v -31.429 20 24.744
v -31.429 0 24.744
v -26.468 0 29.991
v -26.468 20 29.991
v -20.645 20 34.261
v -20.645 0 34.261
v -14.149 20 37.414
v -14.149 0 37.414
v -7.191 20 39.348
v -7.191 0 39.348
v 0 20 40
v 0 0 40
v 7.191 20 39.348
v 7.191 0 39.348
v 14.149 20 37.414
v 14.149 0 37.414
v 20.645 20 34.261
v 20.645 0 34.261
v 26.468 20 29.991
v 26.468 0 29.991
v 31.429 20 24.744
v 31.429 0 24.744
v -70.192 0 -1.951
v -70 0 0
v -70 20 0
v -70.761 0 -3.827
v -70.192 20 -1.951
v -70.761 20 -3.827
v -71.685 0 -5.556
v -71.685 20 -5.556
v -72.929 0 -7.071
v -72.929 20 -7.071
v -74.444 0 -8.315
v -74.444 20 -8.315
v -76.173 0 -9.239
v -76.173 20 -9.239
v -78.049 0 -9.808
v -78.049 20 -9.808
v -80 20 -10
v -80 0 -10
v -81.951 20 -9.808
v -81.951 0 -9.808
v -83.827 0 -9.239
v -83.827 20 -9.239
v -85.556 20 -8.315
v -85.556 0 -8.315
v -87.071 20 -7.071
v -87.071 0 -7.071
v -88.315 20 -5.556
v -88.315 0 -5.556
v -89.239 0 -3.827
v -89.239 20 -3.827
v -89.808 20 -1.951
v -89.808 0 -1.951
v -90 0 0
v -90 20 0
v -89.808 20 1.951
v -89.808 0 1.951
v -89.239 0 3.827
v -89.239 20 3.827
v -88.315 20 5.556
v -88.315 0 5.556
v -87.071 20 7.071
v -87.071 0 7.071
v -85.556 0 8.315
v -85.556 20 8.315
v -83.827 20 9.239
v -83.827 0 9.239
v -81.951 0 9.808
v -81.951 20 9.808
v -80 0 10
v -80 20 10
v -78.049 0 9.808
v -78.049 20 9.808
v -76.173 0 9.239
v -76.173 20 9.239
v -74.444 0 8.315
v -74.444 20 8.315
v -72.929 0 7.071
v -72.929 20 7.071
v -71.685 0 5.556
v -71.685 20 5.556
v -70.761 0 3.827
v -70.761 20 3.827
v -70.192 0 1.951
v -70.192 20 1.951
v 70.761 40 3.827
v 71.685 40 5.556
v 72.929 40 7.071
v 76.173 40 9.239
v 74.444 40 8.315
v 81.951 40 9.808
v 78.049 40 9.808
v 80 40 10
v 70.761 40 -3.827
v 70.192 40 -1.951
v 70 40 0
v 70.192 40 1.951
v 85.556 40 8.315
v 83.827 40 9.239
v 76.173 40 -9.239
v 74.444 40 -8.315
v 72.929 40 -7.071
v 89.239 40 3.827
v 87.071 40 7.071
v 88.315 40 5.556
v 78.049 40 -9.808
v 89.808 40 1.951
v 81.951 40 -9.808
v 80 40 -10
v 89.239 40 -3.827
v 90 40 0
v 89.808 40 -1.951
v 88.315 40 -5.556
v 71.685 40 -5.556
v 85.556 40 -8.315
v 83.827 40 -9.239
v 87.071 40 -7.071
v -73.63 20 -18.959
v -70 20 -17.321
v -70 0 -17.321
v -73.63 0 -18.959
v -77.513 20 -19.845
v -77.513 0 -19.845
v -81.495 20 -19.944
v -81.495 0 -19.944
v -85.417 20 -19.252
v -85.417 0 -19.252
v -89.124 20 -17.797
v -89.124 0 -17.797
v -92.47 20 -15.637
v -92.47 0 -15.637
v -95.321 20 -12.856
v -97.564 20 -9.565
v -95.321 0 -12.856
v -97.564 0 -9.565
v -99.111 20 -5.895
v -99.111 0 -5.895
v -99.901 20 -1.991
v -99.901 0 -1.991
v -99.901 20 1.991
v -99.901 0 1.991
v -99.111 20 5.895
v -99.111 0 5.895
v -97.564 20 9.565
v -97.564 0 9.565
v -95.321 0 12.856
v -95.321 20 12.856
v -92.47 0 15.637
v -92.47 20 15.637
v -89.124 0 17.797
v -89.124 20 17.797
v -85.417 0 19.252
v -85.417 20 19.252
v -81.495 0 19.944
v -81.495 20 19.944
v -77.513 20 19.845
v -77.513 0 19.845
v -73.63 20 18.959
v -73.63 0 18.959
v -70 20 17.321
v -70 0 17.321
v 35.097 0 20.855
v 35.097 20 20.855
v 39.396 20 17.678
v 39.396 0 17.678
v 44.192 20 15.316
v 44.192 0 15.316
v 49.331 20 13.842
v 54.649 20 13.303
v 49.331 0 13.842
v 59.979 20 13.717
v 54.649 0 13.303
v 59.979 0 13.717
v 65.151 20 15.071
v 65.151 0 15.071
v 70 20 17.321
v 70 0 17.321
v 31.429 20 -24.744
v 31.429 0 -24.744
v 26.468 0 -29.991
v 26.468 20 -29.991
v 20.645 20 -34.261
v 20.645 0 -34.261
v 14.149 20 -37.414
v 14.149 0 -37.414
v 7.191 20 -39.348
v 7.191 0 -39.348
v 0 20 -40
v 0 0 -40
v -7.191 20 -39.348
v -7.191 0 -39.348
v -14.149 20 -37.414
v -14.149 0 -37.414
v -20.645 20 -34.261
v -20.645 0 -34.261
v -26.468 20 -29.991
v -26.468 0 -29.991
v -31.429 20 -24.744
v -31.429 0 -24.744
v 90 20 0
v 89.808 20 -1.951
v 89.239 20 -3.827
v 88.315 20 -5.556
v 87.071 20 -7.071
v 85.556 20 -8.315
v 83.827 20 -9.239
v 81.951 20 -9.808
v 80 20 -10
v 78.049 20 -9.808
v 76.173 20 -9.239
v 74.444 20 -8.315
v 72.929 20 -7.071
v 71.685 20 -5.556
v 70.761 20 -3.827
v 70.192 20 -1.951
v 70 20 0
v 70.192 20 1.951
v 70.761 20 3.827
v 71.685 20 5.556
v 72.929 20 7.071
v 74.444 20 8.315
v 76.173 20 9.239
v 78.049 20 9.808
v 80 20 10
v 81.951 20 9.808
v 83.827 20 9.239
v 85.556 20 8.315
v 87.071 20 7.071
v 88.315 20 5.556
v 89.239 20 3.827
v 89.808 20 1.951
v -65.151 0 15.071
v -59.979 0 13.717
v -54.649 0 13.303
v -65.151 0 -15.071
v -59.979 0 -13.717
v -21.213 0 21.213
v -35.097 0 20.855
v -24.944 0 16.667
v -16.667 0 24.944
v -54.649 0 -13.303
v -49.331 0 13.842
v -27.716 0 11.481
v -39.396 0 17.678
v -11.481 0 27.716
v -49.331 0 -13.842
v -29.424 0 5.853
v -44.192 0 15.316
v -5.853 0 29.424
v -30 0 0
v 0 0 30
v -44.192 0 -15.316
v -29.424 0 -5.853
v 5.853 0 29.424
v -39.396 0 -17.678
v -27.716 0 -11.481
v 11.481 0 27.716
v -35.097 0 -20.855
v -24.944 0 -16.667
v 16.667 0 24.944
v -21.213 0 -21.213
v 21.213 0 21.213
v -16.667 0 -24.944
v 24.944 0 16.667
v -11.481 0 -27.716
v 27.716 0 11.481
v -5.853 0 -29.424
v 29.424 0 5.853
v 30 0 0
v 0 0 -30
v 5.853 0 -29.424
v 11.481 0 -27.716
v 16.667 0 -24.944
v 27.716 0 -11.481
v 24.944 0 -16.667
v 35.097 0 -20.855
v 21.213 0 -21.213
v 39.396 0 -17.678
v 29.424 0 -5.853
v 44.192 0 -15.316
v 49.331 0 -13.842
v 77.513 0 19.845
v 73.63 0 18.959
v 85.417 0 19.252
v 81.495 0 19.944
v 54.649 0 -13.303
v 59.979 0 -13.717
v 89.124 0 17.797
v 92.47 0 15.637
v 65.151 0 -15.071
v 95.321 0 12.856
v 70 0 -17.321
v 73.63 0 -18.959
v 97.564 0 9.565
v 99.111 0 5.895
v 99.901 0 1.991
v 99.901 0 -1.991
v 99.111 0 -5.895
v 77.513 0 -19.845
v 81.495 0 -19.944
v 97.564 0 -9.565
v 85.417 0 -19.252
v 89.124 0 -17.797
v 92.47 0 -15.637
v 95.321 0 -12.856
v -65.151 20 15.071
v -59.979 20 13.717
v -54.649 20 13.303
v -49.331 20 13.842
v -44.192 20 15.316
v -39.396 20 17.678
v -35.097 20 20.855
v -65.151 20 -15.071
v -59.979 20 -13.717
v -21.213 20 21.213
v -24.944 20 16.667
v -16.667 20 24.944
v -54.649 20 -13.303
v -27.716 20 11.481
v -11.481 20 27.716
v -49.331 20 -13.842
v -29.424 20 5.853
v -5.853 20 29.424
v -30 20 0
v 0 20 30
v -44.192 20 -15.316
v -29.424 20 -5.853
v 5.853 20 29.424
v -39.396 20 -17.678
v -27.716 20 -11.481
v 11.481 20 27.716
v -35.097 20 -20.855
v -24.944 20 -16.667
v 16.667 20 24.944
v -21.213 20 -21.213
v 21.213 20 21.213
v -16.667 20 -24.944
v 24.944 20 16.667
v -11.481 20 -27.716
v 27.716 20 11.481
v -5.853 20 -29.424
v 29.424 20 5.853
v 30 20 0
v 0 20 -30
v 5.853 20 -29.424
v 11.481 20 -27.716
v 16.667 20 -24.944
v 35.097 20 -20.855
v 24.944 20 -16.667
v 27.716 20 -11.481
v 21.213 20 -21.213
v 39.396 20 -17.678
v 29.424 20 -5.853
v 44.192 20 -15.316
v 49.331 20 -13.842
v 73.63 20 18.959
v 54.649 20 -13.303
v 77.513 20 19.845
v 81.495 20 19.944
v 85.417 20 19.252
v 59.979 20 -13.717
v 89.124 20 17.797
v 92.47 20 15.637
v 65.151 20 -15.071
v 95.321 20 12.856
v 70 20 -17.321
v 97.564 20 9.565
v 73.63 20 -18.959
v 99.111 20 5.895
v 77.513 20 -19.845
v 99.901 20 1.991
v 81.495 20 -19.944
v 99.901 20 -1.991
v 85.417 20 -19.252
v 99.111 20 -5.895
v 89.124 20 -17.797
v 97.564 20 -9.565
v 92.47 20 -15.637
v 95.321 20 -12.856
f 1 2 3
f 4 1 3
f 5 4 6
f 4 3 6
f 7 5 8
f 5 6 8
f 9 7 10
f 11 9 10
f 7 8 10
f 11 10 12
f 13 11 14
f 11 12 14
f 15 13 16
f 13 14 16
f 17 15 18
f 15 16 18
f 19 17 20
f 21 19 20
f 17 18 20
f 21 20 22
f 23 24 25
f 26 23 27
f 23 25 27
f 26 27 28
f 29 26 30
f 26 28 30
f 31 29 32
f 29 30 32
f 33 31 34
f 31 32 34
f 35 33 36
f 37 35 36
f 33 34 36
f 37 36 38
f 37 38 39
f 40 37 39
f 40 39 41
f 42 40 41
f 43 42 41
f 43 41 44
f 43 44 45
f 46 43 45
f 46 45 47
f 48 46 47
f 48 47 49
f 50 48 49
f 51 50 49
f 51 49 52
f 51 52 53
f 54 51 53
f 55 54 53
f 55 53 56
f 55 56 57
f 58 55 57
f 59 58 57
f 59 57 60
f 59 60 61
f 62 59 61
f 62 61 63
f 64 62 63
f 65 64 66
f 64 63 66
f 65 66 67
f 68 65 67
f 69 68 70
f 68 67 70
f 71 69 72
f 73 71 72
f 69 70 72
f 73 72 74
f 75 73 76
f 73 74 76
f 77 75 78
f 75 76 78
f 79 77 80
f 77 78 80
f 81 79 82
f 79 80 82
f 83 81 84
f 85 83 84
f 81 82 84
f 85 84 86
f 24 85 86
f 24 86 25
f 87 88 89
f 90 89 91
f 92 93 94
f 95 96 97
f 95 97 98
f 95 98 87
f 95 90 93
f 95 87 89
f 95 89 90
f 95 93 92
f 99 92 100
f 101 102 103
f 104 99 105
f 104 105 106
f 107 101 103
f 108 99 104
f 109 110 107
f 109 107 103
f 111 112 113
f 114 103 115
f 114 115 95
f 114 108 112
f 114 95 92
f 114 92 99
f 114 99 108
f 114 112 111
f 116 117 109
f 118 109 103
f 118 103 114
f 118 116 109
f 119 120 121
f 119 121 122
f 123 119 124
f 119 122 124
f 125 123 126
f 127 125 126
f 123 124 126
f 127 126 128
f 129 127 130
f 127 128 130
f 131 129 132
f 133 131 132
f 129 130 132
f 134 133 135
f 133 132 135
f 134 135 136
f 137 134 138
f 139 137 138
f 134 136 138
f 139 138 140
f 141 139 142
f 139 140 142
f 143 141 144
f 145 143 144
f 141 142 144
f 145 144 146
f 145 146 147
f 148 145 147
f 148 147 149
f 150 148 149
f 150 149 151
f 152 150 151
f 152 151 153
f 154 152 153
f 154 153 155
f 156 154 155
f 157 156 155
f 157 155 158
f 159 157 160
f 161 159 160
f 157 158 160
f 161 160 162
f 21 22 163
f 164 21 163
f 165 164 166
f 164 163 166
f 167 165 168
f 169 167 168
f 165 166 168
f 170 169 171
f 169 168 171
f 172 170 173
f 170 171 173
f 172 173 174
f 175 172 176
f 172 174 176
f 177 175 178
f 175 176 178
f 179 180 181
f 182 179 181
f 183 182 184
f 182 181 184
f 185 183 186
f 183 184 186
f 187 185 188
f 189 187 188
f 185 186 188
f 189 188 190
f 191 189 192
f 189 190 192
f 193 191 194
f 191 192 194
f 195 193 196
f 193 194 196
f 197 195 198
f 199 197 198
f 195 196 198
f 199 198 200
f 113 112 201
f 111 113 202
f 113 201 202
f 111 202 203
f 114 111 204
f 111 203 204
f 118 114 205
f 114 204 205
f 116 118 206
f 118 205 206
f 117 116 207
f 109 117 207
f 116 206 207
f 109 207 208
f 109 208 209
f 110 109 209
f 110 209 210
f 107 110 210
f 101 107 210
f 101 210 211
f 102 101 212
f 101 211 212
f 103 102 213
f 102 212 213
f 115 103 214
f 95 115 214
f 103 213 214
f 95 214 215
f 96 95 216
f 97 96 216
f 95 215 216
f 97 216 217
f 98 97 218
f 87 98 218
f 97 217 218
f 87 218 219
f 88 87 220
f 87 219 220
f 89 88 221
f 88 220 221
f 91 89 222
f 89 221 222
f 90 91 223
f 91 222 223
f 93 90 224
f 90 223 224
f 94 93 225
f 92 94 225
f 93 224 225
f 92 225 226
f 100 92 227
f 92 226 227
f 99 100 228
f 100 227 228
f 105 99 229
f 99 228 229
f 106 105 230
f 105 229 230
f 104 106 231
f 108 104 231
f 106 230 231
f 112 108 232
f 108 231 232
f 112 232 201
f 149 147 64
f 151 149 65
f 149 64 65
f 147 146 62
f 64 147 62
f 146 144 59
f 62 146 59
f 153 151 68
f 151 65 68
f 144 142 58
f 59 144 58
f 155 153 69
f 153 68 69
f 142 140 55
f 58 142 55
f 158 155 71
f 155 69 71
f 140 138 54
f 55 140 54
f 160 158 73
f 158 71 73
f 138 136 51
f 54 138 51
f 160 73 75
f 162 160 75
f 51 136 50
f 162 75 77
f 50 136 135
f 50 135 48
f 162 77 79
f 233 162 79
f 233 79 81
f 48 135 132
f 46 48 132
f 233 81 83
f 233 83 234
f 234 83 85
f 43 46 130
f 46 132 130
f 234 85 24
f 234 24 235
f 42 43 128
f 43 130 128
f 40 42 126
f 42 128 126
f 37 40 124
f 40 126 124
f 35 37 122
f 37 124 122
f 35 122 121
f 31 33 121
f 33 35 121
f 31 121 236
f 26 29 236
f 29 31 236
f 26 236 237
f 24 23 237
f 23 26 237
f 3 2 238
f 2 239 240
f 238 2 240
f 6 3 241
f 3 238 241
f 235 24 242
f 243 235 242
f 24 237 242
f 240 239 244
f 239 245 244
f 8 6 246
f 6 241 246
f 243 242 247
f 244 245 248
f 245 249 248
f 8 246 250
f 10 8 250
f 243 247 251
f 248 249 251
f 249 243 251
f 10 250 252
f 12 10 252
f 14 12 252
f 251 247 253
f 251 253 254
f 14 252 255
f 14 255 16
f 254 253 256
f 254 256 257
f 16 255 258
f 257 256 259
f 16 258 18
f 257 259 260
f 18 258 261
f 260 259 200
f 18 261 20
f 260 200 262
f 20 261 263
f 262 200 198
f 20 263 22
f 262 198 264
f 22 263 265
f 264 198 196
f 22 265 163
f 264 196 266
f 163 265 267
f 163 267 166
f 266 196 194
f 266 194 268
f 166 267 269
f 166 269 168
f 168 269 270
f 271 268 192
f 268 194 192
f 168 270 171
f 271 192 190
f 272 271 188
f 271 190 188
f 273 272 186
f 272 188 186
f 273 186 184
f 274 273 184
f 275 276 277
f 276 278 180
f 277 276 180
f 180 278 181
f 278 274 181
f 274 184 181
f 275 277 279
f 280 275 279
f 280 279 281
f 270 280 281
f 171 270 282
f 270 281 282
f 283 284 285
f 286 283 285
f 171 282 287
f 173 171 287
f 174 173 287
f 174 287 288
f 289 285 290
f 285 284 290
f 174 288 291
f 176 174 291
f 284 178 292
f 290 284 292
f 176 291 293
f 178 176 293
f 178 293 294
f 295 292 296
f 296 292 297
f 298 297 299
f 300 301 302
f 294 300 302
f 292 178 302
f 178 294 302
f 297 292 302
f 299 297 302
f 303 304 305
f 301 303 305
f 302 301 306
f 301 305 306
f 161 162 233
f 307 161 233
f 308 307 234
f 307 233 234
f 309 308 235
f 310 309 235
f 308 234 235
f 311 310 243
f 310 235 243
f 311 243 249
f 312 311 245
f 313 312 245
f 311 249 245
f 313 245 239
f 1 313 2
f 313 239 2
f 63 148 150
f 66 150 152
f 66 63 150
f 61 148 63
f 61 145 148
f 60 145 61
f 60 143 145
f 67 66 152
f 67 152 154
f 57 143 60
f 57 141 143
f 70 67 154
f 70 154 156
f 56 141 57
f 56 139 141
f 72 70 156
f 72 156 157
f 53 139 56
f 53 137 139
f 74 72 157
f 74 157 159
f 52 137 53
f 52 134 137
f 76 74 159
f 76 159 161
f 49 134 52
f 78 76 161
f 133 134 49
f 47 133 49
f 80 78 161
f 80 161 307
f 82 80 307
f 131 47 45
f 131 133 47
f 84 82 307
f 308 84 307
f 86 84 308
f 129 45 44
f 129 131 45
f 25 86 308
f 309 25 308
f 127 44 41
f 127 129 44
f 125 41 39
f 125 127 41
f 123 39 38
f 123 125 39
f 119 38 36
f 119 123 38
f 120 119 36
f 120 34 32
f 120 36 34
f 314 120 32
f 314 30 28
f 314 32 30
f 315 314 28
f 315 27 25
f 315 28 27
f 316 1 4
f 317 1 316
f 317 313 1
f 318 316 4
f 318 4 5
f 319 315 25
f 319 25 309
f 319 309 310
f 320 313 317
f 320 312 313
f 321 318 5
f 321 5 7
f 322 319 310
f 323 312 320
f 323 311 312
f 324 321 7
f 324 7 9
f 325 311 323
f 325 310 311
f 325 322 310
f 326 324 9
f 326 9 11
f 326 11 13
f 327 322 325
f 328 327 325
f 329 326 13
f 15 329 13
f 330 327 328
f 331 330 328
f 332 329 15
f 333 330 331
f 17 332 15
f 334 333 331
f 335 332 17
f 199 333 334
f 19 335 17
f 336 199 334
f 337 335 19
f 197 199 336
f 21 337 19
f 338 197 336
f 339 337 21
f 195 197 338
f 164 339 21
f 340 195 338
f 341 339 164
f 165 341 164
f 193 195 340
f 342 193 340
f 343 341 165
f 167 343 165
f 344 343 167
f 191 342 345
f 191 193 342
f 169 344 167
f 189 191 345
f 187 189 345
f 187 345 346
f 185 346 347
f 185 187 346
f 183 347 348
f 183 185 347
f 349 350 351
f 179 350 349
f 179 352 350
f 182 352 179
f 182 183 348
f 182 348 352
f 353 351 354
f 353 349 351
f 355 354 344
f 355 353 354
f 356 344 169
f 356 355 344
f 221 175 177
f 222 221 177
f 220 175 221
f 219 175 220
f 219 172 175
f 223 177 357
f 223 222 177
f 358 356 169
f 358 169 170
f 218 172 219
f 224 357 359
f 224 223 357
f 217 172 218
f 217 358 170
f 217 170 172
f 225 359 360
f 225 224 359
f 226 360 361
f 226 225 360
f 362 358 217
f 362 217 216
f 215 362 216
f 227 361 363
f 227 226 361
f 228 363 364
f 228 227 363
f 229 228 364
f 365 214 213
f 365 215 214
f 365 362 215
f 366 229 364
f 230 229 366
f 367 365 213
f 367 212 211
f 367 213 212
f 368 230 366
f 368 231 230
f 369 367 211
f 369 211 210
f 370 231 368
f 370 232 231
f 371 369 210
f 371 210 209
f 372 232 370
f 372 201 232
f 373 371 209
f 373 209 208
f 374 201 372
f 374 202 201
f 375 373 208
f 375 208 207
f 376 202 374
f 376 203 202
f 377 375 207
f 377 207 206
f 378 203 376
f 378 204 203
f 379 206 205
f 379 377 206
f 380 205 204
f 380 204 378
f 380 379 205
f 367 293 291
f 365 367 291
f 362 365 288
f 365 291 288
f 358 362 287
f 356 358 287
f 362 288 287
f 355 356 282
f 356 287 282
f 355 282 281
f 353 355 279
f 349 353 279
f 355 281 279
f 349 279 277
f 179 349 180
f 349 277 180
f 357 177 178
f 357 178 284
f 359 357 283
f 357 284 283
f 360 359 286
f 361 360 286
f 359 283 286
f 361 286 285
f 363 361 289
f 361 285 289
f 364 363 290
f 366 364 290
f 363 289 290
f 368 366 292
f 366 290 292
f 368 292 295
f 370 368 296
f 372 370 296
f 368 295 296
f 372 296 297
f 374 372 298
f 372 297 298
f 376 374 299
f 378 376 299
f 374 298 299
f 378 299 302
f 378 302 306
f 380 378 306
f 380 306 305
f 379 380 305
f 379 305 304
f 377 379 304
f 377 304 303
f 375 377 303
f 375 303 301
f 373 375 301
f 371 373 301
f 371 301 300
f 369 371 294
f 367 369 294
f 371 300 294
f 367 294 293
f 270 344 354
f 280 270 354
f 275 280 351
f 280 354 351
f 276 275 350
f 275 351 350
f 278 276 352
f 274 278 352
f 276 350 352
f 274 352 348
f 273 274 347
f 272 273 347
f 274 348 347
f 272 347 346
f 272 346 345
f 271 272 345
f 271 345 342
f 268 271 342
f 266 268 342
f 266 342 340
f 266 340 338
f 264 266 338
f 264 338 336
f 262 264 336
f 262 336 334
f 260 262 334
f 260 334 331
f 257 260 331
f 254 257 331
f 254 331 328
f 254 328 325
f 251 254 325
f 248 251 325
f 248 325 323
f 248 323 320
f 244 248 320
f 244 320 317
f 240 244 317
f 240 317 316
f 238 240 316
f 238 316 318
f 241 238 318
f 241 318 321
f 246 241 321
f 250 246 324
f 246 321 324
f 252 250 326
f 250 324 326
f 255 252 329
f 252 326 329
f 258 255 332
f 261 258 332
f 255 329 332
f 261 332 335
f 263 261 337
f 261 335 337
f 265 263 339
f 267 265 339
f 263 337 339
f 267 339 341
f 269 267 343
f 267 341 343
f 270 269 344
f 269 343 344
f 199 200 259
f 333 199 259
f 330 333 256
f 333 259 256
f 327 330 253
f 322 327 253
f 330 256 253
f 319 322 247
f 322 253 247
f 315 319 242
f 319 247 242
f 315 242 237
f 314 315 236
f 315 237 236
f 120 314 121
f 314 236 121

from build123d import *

# Parameters (mm, degrees)
SALIENTE_EXTRUIR1_DEPTH = 20
CROQUIS2_R              = 30
CORTAR_EXTRUIR1_DEPTH   = 21
CROQUIS3_R              = 10
CORTAR_EXTRUIR2_DEPTH   = 21
CROQUIS4_R              = 10
SALIENTE_EXTRUIR2_DEPTH = 20


with BuildPart() as part:
    # Croquis1 → Saliente-Extruir1 (new body)
    with BuildSketch(Plane(origin=(0, 0, 0), x_dir=(1, 0, 0), z_dir=(0, 1, 0))):
        with BuildLine():
            ThreePointArc((70, -17.320508076), (100, 0), (70, 17.320508076))
            ThreePointArc((70, 17.320508076), (49.330532905, 13.841855007), (31.428571429, 24.743582965))
            ThreePointArc((31.428571429, 24.743582965), (0, 40), (-31.428571429, 24.743582965))
            ThreePointArc((-31.428571429, 24.743582965), (-49.330532905, 13.841855007), (-70, 17.320508076))
            ThreePointArc((-70, 17.320508076), (-100, 0), (-70, -17.320508076))
            ThreePointArc((-70, -17.320508076), (-49.330532905, -13.841855007), (-31.428571429, -24.743582965))
            ThreePointArc((-31.428571429, -24.743582965), (0, -40), (31.428571429, -24.743582965))
            ThreePointArc((31.428571429, -24.743582965), (49.330532905, -13.841855007), (70, -17.320508076))
        make_face()
    extrude(amount=SALIENTE_EXTRUIR1_DEPTH)

    # Croquis2 → Cortar-Extruir1 (cut, through all)
    with BuildSketch(Plane(origin=(0, 20, 0), x_dir=(1, 0, 0), z_dir=(0, 1, 0))):
        Circle(CROQUIS2_R)
    extrude(amount=-CORTAR_EXTRUIR1_DEPTH, mode=Mode.SUBTRACT)

    # Croquis3 → Cortar-Extruir2 (cut, through all)
    with BuildSketch(Plane(origin=(0, 20, 0), x_dir=(1, 0, 0), z_dir=(0, 1, 0))):
        with Locations((-80, 0)):
            Circle(CROQUIS3_R)
    extrude(amount=-CORTAR_EXTRUIR2_DEPTH, mode=Mode.SUBTRACT)

    # Croquis4 → Saliente-Extruir2 (add)
    with BuildSketch(Plane(origin=(0, 20, 0), x_dir=(1, 0, 0), z_dir=(0, 1, 0))):
        with Locations((80, 0)):
            Circle(CROQUIS4_R)
    extrude(amount=SALIENTE_EXTRUIR2_DEPTH)


solid = part.part
